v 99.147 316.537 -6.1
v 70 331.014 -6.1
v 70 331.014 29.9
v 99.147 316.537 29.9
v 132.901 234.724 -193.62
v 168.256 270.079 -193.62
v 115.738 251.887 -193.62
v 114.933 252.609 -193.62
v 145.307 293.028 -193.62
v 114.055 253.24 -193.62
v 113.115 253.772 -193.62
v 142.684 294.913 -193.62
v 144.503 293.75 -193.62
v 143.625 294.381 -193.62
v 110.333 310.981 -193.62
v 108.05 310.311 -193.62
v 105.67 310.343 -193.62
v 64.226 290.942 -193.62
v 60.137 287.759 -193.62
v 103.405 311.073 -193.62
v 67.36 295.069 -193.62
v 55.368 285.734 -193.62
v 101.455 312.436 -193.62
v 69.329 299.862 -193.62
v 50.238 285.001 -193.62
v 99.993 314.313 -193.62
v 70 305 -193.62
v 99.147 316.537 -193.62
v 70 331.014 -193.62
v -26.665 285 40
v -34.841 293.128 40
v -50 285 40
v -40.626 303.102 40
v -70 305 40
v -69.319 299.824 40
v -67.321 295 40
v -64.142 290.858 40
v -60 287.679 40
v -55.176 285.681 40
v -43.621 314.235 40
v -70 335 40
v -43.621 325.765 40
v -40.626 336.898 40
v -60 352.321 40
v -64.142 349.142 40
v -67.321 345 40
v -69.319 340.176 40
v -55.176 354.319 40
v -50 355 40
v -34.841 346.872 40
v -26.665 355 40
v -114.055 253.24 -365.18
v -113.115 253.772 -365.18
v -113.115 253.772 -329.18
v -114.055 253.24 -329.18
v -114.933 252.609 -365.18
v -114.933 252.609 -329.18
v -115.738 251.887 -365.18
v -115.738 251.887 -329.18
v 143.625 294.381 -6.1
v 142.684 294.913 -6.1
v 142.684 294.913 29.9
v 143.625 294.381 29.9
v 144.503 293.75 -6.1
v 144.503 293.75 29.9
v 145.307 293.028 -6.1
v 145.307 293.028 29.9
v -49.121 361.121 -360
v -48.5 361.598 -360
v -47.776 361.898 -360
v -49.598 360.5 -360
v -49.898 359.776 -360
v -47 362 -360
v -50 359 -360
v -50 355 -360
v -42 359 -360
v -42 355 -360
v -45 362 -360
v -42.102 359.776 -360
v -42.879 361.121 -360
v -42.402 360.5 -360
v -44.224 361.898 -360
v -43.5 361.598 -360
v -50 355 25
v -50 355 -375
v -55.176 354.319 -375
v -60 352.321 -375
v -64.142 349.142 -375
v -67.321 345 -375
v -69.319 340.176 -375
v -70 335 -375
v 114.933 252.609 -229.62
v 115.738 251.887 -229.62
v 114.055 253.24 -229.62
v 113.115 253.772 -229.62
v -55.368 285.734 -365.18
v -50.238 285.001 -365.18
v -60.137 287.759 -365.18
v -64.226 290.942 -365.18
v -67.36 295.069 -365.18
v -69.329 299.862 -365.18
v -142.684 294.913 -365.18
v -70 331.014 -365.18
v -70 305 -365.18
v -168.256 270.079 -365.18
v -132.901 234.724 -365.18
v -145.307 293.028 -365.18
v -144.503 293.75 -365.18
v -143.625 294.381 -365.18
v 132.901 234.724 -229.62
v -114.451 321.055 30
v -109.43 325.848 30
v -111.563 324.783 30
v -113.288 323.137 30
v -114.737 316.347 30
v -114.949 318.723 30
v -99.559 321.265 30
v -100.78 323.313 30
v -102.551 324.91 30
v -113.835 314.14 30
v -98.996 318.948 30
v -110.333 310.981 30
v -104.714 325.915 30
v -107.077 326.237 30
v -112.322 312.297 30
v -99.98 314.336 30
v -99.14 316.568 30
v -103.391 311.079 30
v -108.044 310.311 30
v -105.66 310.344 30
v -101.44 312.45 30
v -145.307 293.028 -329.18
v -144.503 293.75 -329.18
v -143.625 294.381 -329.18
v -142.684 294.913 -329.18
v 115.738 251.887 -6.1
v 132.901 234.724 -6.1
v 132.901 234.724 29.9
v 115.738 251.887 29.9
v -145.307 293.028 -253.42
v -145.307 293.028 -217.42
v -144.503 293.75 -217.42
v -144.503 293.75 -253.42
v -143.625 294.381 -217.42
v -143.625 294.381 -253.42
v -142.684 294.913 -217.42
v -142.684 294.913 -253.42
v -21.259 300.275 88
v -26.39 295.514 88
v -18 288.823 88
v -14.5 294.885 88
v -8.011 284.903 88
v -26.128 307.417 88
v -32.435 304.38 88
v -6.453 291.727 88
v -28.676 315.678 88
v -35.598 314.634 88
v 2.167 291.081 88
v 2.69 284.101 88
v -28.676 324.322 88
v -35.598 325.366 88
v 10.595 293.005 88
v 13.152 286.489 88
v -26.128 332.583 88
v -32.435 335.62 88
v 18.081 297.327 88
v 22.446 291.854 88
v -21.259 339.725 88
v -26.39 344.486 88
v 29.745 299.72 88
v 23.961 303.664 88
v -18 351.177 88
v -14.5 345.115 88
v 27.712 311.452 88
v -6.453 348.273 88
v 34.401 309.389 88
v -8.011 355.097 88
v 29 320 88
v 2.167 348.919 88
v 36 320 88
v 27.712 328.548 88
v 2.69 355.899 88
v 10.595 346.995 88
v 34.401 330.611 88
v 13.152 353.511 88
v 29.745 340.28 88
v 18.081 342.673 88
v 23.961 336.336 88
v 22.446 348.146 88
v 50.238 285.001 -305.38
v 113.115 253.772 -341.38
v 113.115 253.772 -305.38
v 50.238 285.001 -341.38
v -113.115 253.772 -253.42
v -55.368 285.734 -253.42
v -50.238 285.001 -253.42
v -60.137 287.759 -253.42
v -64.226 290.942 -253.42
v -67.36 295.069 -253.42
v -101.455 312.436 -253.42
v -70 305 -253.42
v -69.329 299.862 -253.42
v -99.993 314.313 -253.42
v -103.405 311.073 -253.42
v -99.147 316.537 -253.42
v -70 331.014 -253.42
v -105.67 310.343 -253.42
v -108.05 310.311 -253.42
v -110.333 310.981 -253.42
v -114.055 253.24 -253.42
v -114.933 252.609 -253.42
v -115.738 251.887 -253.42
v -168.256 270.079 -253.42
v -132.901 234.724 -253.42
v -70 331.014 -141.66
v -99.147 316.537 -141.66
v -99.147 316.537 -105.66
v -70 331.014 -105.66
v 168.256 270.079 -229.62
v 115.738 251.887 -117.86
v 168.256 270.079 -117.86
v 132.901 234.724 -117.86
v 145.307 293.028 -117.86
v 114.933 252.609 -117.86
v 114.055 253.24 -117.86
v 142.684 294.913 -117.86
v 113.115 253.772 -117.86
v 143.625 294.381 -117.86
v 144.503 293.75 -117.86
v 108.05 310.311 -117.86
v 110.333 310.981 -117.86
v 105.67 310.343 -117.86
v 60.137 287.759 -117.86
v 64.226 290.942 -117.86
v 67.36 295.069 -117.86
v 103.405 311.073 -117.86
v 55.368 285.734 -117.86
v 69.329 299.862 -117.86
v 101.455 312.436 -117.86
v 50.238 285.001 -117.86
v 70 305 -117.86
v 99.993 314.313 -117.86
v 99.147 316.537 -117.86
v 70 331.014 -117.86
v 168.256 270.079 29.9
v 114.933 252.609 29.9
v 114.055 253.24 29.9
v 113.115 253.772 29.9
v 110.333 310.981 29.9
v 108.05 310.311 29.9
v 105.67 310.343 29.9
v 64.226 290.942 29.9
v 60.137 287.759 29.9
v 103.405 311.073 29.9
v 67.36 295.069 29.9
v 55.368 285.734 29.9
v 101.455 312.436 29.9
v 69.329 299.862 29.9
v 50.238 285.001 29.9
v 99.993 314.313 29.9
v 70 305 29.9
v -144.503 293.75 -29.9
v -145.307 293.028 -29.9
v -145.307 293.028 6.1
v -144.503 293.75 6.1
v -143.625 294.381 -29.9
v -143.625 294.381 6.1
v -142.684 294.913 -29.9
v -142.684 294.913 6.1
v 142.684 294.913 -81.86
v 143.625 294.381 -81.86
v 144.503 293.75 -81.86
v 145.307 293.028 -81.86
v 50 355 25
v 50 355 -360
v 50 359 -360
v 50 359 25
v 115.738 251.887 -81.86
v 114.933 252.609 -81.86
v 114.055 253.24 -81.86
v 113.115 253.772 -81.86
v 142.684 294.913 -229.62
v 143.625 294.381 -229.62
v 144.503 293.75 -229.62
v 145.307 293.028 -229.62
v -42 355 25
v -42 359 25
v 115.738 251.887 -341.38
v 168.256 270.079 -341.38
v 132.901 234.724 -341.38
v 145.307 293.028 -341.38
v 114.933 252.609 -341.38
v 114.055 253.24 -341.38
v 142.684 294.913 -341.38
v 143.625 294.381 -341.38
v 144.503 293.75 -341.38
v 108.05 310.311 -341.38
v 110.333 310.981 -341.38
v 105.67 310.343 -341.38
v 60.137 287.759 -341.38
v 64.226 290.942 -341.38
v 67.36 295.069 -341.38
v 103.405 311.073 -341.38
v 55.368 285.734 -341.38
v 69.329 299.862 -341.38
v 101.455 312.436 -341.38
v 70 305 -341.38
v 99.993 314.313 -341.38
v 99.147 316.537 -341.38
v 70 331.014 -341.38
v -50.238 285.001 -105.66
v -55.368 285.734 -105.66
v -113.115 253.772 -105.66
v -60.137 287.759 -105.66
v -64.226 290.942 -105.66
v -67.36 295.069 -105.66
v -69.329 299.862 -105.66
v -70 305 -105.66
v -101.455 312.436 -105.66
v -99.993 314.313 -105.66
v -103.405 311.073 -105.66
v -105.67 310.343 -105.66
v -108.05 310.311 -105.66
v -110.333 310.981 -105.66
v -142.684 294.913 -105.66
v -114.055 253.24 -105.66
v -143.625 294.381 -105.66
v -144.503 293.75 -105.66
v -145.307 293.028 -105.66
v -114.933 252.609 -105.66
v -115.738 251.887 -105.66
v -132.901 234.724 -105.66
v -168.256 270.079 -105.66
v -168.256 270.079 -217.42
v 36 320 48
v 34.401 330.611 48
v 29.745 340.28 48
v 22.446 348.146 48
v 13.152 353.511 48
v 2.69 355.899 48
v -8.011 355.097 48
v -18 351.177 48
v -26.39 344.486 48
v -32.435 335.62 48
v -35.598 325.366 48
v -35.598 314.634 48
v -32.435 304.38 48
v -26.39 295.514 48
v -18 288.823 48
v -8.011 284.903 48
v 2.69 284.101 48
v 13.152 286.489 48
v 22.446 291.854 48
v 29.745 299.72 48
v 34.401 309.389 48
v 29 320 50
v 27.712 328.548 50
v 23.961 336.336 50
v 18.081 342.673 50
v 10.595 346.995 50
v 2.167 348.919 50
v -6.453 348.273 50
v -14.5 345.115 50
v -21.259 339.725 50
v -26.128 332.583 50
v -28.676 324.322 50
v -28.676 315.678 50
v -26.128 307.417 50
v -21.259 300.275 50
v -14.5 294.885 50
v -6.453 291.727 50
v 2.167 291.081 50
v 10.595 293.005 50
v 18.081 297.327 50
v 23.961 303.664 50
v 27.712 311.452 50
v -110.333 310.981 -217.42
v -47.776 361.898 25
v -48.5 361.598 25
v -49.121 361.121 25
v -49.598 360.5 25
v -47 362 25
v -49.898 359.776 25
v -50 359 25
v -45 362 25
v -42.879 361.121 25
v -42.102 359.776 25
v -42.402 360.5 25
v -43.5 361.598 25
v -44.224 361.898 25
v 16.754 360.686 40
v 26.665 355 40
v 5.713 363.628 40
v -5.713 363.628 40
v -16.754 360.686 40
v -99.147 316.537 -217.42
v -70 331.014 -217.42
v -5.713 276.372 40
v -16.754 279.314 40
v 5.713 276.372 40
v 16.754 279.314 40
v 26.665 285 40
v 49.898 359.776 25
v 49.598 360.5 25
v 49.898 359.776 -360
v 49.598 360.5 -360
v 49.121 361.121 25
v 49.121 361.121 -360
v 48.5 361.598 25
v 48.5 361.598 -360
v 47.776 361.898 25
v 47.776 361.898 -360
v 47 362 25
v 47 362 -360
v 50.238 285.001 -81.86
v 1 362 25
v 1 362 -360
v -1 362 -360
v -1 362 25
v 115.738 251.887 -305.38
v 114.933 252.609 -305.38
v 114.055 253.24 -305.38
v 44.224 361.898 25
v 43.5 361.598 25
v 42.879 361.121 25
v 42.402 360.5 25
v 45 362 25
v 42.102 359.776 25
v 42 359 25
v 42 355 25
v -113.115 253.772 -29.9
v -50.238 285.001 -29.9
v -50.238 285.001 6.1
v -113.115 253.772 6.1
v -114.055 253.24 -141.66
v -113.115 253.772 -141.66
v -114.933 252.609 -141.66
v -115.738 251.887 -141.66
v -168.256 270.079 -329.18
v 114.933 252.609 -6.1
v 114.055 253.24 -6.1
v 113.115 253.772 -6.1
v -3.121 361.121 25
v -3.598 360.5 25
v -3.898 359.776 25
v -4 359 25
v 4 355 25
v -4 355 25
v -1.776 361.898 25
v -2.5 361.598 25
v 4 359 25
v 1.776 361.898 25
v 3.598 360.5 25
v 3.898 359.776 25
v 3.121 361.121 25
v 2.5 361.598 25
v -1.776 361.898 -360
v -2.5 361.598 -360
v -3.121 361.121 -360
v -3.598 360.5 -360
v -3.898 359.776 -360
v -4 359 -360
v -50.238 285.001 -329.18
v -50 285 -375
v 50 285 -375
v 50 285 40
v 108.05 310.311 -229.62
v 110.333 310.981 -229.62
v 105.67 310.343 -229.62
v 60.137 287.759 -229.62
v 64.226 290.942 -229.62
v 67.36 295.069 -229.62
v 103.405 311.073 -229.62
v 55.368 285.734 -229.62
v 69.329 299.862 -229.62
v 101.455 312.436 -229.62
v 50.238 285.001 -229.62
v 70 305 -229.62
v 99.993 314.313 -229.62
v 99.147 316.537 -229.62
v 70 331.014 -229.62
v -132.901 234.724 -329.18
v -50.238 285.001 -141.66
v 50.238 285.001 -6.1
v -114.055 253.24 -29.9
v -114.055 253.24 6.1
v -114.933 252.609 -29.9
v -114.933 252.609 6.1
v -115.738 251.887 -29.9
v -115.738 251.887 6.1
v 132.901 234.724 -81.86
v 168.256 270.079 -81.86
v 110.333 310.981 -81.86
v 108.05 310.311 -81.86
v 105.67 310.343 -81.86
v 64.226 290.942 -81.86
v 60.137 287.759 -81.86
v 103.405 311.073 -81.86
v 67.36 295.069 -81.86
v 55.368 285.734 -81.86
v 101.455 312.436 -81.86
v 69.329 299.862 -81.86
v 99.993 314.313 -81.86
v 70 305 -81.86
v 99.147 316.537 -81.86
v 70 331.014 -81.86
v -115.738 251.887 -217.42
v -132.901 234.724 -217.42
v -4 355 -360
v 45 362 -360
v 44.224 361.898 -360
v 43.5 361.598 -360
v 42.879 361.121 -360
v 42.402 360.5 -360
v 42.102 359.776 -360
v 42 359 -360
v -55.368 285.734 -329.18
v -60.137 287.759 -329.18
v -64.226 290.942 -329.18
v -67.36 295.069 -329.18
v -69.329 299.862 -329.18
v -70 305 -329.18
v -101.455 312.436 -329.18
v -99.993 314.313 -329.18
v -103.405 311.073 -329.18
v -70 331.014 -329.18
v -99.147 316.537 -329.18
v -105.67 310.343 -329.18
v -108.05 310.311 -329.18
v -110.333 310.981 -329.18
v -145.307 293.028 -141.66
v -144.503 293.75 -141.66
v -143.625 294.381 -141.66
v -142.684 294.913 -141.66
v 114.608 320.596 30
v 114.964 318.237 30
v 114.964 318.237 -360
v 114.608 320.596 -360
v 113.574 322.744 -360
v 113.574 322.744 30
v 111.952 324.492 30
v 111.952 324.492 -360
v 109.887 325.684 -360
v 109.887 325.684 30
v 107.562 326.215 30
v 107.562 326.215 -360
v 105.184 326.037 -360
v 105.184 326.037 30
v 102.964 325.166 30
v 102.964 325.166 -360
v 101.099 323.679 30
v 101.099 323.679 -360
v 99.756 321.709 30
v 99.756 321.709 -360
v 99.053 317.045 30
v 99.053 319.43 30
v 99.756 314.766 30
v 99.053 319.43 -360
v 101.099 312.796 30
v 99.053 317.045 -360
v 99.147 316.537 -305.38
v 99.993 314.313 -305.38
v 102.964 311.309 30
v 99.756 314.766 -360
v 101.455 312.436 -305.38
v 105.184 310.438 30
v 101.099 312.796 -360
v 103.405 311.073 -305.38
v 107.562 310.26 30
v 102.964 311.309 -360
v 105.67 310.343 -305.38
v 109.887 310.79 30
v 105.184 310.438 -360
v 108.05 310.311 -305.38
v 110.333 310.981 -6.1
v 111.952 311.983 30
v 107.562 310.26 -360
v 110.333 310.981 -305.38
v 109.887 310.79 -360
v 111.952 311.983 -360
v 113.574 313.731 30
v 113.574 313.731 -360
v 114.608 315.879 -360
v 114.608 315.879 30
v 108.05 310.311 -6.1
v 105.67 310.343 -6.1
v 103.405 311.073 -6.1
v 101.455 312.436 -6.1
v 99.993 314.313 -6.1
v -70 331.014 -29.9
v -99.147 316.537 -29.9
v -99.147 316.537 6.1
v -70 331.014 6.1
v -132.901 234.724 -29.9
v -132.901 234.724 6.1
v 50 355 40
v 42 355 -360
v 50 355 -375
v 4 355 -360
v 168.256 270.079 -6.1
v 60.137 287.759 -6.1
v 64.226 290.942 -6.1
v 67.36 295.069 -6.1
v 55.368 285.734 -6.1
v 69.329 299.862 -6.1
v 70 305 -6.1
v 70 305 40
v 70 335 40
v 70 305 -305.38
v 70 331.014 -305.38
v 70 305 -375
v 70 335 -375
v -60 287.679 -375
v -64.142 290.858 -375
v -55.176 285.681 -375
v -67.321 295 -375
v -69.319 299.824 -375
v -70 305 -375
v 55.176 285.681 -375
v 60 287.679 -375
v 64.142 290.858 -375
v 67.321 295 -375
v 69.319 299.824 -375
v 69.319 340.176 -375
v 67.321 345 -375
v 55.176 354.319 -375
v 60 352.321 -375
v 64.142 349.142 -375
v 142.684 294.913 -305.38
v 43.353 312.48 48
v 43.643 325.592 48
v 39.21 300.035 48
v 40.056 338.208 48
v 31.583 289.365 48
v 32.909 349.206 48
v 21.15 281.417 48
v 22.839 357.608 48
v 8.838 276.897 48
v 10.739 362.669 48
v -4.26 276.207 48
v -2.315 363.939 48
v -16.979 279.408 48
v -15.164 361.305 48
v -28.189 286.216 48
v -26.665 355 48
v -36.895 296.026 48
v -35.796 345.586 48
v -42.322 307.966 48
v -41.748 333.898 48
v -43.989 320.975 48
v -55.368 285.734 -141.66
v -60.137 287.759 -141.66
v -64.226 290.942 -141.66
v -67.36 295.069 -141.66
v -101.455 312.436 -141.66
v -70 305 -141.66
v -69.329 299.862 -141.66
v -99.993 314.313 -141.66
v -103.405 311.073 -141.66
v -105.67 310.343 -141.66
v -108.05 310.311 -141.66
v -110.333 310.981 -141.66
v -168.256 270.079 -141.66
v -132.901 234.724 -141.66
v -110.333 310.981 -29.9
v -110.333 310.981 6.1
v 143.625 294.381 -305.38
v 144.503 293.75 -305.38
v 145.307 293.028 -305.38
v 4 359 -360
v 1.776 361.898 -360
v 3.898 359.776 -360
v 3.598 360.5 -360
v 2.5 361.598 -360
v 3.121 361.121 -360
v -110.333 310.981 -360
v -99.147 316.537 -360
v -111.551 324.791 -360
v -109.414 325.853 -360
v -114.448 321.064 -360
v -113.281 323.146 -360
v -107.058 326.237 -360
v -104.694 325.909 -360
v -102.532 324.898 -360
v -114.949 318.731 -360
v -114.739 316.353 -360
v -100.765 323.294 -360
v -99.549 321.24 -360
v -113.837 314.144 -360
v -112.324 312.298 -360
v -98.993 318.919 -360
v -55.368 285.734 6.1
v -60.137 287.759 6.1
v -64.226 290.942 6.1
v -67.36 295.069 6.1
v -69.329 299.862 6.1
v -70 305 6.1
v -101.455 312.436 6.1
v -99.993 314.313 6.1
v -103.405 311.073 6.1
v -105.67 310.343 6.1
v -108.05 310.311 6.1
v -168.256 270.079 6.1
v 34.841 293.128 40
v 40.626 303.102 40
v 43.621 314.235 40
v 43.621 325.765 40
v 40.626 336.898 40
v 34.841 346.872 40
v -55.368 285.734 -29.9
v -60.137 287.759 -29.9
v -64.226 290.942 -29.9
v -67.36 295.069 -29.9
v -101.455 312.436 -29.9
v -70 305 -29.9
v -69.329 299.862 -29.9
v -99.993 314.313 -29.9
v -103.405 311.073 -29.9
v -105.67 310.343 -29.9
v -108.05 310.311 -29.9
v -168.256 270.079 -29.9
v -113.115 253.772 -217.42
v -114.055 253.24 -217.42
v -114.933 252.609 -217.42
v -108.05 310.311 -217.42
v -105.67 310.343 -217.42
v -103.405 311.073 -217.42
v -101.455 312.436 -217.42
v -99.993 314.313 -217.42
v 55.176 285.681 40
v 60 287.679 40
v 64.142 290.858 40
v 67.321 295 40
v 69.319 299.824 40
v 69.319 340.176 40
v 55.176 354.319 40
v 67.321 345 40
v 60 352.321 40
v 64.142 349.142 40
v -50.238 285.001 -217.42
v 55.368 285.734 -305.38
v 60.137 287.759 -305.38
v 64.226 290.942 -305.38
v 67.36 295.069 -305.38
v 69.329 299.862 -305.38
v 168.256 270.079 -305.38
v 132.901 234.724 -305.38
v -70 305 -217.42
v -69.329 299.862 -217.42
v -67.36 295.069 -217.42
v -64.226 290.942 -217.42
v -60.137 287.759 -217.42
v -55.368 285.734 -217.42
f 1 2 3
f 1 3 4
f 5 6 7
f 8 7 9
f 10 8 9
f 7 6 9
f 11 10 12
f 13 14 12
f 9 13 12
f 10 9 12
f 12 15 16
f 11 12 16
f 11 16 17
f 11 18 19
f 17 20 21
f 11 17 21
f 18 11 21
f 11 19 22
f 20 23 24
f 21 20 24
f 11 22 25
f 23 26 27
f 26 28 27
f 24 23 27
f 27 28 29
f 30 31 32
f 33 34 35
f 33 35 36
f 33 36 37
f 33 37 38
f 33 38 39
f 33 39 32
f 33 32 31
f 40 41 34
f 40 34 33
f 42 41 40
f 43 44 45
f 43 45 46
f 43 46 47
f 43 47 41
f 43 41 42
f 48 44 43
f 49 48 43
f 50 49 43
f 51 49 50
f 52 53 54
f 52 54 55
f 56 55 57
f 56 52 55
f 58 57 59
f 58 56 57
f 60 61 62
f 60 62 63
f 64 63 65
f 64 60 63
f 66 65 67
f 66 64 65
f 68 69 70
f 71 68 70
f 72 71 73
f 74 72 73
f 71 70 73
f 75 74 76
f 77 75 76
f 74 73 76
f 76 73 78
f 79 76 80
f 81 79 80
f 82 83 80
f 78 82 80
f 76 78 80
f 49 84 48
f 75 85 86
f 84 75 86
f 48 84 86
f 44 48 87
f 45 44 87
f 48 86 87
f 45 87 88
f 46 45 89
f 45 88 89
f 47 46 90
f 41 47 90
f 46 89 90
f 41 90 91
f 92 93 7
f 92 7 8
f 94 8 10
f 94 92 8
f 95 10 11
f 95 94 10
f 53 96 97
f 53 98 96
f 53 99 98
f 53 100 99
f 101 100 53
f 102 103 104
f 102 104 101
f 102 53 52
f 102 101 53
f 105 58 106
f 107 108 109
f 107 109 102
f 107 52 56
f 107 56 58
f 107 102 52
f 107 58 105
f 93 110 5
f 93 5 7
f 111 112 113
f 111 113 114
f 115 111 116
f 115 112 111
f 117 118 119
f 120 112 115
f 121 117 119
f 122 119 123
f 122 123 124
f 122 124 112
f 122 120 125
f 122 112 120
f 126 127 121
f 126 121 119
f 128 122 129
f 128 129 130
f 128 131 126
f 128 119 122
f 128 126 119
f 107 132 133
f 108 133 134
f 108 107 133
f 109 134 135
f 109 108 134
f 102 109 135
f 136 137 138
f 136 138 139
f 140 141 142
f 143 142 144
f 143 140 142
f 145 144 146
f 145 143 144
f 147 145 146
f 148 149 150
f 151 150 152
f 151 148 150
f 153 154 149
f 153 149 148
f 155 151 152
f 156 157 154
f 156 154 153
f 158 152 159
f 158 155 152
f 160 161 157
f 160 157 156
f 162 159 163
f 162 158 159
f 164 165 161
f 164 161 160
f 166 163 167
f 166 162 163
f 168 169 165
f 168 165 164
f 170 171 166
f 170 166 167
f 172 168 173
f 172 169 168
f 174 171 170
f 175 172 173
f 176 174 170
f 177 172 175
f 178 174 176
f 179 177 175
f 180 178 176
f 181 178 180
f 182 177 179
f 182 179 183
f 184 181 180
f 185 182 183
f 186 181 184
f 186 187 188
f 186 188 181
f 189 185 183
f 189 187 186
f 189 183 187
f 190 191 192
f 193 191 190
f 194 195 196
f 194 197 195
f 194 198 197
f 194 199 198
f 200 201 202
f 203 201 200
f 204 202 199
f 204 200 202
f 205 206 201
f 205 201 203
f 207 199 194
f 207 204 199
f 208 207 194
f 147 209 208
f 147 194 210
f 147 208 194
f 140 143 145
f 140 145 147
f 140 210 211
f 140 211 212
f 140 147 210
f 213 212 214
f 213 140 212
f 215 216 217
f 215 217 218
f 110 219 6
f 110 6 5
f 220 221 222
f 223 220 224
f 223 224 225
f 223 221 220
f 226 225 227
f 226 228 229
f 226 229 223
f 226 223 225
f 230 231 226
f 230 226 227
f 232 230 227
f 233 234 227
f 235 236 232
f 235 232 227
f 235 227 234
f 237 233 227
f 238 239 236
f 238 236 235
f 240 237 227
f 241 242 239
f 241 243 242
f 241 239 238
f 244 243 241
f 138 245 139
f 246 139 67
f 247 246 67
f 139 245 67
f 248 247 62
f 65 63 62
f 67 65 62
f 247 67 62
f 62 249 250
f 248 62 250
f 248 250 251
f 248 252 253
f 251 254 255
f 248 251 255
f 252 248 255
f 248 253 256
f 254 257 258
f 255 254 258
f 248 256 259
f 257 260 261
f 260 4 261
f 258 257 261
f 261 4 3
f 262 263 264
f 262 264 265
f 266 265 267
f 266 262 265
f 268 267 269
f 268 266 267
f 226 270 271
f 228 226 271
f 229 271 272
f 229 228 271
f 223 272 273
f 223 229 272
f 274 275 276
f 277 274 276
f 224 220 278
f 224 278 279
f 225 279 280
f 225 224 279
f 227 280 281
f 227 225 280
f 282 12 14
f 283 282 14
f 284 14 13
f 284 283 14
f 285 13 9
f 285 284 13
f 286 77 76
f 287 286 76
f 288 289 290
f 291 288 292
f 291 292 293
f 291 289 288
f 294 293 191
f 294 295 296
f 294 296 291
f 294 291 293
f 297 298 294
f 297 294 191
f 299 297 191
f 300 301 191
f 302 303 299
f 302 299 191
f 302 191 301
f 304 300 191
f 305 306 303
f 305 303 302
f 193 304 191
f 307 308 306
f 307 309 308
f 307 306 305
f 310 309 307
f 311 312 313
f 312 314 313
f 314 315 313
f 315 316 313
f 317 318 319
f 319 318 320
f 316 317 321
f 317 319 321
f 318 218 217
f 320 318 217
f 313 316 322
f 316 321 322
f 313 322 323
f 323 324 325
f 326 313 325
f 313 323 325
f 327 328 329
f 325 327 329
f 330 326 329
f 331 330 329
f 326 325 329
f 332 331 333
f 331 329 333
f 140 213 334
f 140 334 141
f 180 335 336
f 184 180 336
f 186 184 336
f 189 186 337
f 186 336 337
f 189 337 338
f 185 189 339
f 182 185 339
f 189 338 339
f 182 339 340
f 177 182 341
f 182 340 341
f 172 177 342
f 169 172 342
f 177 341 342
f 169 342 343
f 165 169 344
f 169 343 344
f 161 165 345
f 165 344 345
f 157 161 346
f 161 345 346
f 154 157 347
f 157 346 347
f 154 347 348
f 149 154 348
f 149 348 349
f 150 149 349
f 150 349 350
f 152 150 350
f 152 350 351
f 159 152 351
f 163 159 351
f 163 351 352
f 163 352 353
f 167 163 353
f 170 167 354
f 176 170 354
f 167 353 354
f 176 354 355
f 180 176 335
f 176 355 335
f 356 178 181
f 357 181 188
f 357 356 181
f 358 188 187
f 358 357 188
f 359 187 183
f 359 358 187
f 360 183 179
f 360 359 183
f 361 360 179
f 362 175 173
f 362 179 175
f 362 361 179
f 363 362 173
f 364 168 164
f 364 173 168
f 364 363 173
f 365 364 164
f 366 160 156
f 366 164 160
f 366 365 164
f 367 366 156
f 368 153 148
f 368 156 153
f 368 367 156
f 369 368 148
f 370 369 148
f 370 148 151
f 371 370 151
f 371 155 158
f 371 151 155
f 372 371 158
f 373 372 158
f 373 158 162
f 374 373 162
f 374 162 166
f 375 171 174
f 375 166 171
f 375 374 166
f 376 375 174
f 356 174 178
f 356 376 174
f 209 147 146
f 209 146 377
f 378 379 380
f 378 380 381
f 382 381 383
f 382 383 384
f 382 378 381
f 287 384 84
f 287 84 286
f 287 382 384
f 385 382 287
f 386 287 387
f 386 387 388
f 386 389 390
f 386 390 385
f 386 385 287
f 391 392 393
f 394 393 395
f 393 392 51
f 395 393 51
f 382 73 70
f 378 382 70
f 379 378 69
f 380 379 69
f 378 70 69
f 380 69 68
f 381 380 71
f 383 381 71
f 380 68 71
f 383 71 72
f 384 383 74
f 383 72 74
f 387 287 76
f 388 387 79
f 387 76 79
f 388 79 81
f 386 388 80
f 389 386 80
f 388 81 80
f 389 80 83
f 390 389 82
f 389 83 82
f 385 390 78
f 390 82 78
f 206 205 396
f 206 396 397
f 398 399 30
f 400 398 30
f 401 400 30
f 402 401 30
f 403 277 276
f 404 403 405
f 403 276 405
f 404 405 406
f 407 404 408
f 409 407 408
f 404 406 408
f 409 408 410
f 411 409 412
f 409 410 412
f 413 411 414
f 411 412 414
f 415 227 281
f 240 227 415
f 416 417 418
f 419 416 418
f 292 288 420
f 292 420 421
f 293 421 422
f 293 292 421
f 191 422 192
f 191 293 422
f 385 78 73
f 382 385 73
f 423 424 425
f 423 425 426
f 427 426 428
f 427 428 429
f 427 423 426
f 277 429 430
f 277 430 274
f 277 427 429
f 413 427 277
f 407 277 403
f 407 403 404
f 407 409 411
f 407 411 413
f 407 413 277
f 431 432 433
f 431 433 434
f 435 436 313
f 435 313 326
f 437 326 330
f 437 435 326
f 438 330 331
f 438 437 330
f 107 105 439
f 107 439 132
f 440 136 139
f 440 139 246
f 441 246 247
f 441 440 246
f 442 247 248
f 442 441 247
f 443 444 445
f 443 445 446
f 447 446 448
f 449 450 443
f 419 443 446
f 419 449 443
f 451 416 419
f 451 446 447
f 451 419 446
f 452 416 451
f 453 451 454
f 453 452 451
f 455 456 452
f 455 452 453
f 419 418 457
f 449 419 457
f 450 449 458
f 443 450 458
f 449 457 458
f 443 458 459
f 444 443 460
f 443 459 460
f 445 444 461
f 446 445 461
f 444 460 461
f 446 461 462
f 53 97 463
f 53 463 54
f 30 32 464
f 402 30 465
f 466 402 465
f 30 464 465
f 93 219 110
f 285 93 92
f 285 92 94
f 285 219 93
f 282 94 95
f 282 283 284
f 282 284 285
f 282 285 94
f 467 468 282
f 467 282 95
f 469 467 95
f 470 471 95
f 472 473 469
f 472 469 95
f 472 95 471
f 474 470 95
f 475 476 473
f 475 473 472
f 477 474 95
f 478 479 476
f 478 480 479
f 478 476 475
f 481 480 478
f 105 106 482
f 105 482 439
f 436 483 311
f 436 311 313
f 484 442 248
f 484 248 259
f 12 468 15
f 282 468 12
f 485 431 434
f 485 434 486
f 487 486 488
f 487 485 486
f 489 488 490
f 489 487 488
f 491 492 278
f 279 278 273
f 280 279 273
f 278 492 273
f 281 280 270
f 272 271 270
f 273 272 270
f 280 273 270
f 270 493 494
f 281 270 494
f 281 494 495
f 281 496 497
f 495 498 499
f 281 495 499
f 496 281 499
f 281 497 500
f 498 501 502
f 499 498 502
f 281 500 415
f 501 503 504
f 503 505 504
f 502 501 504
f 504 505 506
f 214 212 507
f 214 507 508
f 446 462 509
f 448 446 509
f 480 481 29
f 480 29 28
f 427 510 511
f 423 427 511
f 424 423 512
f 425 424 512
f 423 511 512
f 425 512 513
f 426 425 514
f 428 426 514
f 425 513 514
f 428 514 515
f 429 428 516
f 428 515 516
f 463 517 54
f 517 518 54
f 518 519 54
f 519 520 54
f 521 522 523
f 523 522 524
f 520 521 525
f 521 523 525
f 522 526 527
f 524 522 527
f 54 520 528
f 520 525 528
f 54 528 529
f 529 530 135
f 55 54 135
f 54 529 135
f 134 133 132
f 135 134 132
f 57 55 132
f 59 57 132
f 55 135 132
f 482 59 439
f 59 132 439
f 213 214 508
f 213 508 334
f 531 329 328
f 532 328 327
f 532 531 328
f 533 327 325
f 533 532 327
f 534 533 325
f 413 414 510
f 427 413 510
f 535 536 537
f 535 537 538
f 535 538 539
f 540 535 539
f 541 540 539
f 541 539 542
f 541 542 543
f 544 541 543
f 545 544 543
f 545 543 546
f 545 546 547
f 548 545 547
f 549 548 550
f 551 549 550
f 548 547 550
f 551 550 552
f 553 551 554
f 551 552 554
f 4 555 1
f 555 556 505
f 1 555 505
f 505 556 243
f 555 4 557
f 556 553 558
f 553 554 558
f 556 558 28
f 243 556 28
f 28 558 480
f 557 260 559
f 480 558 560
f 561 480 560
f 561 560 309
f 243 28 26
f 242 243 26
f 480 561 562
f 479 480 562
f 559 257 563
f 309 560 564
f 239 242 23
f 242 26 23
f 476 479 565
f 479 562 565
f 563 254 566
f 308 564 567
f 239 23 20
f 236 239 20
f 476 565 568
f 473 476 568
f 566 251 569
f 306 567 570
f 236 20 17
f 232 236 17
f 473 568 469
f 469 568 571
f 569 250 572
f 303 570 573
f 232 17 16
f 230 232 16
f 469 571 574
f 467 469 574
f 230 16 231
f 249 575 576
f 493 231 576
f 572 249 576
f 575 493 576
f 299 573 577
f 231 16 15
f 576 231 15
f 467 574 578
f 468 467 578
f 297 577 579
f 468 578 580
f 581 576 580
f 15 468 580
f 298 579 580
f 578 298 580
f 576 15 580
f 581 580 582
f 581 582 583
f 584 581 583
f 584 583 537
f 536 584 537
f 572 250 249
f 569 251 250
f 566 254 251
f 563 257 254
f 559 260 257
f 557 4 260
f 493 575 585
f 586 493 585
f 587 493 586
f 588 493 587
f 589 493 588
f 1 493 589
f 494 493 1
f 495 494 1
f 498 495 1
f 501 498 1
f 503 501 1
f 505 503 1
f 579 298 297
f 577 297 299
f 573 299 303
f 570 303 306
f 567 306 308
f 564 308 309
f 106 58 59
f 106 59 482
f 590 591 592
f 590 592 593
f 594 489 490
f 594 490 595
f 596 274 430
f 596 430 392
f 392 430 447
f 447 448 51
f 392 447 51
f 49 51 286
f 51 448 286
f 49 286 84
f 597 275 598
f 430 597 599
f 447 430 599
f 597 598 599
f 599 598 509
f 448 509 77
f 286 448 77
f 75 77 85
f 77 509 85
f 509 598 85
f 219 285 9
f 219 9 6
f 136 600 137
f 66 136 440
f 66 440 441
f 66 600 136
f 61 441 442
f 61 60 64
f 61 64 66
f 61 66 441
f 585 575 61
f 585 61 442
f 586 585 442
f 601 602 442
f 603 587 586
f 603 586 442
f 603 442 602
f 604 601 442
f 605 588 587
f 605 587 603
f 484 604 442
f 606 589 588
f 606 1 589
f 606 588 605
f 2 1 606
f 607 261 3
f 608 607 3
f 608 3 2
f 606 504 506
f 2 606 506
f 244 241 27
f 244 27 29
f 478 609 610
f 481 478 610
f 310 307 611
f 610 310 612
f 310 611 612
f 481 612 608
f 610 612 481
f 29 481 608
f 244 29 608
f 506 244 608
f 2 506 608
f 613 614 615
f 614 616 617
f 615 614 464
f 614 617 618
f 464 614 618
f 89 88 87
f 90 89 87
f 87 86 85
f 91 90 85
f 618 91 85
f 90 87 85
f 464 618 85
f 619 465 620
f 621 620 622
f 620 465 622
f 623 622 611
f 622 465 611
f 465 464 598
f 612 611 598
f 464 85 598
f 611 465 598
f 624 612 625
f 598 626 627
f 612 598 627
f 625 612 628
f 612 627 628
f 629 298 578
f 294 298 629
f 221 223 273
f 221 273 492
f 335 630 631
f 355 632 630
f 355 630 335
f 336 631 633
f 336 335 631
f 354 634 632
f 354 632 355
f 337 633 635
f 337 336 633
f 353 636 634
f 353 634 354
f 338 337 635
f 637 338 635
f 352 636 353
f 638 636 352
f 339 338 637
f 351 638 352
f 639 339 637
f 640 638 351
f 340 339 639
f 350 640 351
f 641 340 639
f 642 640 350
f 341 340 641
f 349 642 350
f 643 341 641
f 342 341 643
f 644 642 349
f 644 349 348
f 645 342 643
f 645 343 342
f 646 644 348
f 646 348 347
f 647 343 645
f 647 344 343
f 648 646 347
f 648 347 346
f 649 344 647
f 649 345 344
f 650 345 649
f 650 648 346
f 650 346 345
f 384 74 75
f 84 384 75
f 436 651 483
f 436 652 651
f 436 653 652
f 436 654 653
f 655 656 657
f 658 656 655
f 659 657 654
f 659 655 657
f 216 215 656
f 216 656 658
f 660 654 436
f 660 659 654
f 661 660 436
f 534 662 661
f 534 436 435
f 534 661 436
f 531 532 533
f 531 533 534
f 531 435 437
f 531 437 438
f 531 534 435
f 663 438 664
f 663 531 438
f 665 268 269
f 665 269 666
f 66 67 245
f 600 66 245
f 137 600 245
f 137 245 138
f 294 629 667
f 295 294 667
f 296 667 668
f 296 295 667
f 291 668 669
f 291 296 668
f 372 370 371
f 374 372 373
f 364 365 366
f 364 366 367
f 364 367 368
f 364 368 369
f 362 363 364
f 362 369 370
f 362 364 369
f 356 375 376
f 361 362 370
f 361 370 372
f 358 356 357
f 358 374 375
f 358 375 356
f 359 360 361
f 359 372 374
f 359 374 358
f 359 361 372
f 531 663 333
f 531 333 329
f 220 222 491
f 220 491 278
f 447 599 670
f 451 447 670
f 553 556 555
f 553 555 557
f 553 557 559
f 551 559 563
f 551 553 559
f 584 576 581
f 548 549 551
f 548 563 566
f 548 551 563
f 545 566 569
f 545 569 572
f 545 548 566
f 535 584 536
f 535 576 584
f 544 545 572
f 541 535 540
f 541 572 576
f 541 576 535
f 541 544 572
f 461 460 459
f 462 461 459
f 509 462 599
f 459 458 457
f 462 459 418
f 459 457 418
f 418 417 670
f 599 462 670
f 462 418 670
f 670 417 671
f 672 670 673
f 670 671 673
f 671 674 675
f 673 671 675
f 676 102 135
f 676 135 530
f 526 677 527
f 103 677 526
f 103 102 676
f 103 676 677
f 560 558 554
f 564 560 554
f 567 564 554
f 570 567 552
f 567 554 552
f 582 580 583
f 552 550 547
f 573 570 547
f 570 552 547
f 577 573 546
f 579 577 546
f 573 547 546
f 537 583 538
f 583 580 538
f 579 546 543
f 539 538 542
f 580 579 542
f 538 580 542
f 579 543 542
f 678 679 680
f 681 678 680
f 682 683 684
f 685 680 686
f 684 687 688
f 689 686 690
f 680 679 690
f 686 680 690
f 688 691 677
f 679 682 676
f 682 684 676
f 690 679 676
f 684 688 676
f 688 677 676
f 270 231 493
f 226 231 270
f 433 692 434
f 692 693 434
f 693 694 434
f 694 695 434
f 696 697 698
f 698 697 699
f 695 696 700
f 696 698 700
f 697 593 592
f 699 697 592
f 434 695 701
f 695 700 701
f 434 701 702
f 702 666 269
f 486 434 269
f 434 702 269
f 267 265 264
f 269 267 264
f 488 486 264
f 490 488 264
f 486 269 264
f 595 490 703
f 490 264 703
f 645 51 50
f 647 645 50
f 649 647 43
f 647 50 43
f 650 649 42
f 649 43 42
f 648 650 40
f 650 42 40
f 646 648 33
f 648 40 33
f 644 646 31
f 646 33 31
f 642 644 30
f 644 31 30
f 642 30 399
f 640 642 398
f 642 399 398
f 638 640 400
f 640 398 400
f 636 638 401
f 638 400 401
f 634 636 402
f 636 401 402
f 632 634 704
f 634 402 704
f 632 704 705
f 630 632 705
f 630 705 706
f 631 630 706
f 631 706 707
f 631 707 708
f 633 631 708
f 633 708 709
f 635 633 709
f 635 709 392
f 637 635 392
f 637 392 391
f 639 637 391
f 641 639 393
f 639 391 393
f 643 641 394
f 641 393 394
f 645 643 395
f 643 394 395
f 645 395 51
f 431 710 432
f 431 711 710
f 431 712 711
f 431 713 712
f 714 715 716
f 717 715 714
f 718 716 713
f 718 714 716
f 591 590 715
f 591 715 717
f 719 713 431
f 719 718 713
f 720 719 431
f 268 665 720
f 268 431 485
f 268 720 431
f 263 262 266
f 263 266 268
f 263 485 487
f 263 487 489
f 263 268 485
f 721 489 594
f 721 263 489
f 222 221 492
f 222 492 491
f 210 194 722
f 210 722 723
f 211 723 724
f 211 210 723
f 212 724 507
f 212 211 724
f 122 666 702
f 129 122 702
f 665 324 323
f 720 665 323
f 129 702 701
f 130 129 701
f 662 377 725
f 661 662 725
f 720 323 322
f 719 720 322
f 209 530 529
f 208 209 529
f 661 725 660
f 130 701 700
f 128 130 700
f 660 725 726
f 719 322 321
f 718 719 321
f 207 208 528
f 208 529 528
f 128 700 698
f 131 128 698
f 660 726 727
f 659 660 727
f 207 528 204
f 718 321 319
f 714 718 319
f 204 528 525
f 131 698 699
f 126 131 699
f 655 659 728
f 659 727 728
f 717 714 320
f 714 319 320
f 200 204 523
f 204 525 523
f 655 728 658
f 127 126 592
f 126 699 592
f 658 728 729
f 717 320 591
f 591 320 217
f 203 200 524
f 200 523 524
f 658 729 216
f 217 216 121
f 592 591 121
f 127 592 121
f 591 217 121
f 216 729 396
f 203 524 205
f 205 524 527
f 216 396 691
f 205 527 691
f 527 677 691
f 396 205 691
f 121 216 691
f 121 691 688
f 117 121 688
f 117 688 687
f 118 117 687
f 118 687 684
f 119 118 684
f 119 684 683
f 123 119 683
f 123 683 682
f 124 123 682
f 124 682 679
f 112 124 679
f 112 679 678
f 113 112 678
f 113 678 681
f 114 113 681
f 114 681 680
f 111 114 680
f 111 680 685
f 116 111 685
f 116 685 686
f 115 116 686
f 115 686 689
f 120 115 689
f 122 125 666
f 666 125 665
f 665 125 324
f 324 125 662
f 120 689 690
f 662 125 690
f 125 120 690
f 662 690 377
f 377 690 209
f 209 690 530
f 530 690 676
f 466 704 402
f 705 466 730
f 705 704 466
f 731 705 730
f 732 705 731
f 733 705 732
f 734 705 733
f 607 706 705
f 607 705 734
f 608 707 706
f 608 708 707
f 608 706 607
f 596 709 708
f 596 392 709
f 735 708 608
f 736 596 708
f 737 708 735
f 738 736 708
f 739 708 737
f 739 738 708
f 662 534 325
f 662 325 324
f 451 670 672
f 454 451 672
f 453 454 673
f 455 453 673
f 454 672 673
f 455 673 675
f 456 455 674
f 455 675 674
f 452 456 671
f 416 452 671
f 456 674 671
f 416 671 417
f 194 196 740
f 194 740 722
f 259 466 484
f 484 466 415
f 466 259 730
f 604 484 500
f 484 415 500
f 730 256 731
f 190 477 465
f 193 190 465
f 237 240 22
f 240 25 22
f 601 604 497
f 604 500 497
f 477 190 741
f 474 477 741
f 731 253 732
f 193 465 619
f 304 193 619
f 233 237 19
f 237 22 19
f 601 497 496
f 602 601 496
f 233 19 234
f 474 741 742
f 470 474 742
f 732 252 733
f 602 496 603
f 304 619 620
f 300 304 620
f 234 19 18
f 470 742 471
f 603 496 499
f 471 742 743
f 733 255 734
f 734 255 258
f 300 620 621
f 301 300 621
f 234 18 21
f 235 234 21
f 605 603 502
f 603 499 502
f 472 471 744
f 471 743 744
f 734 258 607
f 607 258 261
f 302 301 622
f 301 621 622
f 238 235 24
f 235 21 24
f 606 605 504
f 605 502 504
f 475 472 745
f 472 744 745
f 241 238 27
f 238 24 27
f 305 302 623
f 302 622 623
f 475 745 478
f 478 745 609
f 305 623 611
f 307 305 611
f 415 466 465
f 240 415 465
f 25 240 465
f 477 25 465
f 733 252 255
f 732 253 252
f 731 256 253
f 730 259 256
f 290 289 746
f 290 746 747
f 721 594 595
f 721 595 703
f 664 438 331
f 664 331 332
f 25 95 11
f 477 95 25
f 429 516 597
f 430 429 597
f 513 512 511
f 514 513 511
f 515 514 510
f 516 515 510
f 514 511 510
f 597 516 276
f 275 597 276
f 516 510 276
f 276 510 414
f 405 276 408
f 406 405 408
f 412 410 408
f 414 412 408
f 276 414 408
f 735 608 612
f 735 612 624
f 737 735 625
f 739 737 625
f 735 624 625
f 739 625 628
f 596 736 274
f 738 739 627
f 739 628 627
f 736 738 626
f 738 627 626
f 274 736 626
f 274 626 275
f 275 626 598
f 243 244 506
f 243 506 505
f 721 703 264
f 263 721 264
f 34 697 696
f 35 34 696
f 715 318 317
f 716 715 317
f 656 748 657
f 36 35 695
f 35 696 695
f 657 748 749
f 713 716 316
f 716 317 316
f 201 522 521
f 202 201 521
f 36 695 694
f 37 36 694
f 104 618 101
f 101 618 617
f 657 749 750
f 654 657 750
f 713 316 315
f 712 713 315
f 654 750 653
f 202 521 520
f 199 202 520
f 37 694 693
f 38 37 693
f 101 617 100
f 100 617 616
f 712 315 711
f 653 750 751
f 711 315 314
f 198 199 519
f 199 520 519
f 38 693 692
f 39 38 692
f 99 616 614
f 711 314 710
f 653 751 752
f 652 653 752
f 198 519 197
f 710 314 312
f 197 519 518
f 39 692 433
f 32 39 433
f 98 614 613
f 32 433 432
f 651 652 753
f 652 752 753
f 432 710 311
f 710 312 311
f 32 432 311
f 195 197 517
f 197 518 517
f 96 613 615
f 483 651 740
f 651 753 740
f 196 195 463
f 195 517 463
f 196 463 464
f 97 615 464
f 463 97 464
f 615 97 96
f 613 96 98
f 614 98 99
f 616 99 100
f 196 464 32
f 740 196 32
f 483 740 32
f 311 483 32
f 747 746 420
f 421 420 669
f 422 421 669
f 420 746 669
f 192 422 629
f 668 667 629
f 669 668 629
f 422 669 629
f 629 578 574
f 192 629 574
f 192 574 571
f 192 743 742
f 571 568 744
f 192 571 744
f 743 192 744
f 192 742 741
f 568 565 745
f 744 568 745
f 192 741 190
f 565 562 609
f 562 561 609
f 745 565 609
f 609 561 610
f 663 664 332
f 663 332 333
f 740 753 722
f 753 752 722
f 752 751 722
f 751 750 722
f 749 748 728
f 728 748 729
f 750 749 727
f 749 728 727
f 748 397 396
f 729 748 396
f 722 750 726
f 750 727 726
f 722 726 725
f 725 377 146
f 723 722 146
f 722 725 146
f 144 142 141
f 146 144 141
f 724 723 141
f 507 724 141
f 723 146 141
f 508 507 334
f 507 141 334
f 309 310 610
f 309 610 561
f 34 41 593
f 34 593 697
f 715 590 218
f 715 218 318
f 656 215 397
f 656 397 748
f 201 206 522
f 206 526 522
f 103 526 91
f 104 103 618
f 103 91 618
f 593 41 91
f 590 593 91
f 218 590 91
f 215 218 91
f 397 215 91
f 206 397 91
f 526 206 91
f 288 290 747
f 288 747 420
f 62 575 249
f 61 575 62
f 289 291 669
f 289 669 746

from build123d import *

# Parameters (mm, degrees)
PLENUM_START          = -375
PLENUM_DEPTH          = 415
PLENUM_START_2        = -360
PLENUM_RIBS_DEPTH     = 385
RUNNER_START          = -6.1
RUNNER_1_DEPTH        = 36
RUNNER_START_2        = -29.9
RUNNER_2_DEPTH        = 36
RUNNER_START_3        = -117.86
RUNNER_3_DEPTH        = 36
RUNNER_START_4        = -141.66
RUNNER_4_DEPTH        = 36
RUNNER_START_5        = -229.62
RUNNER_5_DEPTH        = 36
RUNNER_START_6        = -253.42
RUNNER_6_DEPTH        = 36
RUNNER_START_7        = -341.38
RUNNER_7_DEPTH        = 36
RUNNER_START_8        = -365.18
RUNNER_8_DEPTH        = 36
THROTTLE_START        = 40
SKETCH11_R            = 44
THROTTLE_FLANGE_DEPTH = 8
THROTTLE_START_2      = 48
SKETCH12_R            = 36
THROTTLE_BODY_DEPTH   = 40
THROTTLE_START_3      = 50
SKETCH13_R            = 29
THROTTLE_BORE_DEPTH   = 40
FUEL_START            = -360
SKETCH14_R            = 8
FUEL_RAILS_DEPTH      = 390


with BuildPart() as part:
    # Sketch1 → Plenum (new body)
    with BuildSketch(Plane.XY.offset(PLENUM_START)):
        with BuildLine():
            Line((-50, 285), (50, 285))
            ThreePointArc((50, 285), (64.142135624, 290.857864376), (70, 305))
            Line((70, 305), (70, 335))
            ThreePointArc((70, 335), (64.142135624, 349.142135624), (50, 355))
            Line((50, 355), (-50, 355))
            ThreePointArc((-50, 355), (-64.142135624, 349.142135624), (-70, 335))
            Line((-70, 335), (-70, 305))
            ThreePointArc((-70, 305), (-64.142135624, 290.857864376), (-50, 285))
        make_face()
    extrude(amount=PLENUM_DEPTH)

    # Sketch2 → Plenum Ribs (add)
    with BuildSketch(Plane.XY.offset(PLENUM_START_2)):
        with BuildLine():
            Line((-50, 350), (-42, 350))
            Line((-42, 350), (-42, 359))
            ThreePointArc((-42, 359), (-42.878679656, 361.121320344), (-45, 362))
            Line((-45, 362), (-47, 362))
            ThreePointArc((-47, 362), (-49.121320344, 361.121320344), (-50, 359))
            Line((-50, 359), (-50, 350))
        make_face()
        with BuildLine():
            Line((-4, 350), (4, 350))
            Line((4, 350), (4, 359))
            ThreePointArc((4, 359), (3.121320344, 361.121320344), (1, 362))
            Line((1, 362), (-1, 362))
            ThreePointArc((-1, 362), (-3.121320344, 361.121320344), (-4, 359))
            Line((-4, 359), (-4, 350))
        make_face()
        with BuildLine():
            Line((42, 350), (50, 350))
            Line((50, 350), (50, 359))
            ThreePointArc((50, 359), (49.121320344, 361.121320344), (47, 362))
            Line((47, 362), (45, 362))
            ThreePointArc((45, 362), (42.878679656, 361.121320344), (42, 359))
            Line((42, 359), (42, 350))
        make_face()
    extrude(amount=PLENUM_RIBS_DEPTH)

    # Sketch3 → Runner 1 (add)
    with BuildSketch(Plane.XY.offset(RUNNER_START)):
        with BuildLine():
            Line((132.900719524, 234.724096015), (115.737566336, 251.887249203))
            ThreePointArc((115.737566336, 251.887249203), (114.502776925, 252.936394099), (113.114761283, 253.772350127))
            Line((113.114761283, 253.772350127), (28.879343102, 295.60957816))
            Line((28.879343102, 295.60957816), (51.120656898, 340.39042184))
            Line((51.120656898, 340.39042184), (142.684314275, 294.913475254))
            ThreePointArc((142.684314275, 294.913475254), (144.072329917, 294.077519226), (145.307119327, 293.02837433))
            Line((145.307119327, 293.02837433), (168.256058583, 270.079435074))
            Line((168.256058583, 270.079435074), (132.900719524, 234.724096015))
        make_face()
    extrude(amount=RUNNER_1_DEPTH)

    # Sketch4 → Runner 2 (add)
    with BuildSketch(Plane.XY.offset(RUNNER_START_2)):
        with BuildLine():
            Line((-168.256058583, 270.079435074), (-145.307119327, 293.02837433))
            ThreePointArc((-145.307119327, 293.02837433), (-144.072329917, 294.077519226), (-142.684314275, 294.913475254))
            Line((-142.684314275, 294.913475254), (-51.120656898, 340.39042184))
            Line((-51.120656898, 340.39042184), (-28.879343102, 295.60957816))
            Line((-28.879343102, 295.60957816), (-113.114761283, 253.772350127))
            ThreePointArc((-113.114761283, 253.772350127), (-114.502776925, 252.936394099), (-115.737566336, 251.887249203))
            Line((-115.737566336, 251.887249203), (-132.900719524, 234.724096015))
            Line((-132.900719524, 234.724096015), (-168.256058583, 270.079435074))
        make_face()
    extrude(amount=RUNNER_2_DEPTH)

    # Sketch5 → Runner 3 (add)
    with BuildSketch(Plane.XY.offset(RUNNER_START_3)):
        with BuildLine():
            Line((132.900719524, 234.724096015), (115.737566336, 251.887249203))
            ThreePointArc((115.737566336, 251.887249203), (114.502776925, 252.936394099), (113.114761283, 253.772350127))
            Line((113.114761283, 253.772350127), (28.879343102, 295.60957816))
            Line((28.879343102, 295.60957816), (51.120656898, 340.39042184))
            Line((51.120656898, 340.39042184), (142.684314275, 294.913475254))
            ThreePointArc((142.684314275, 294.913475254), (144.072329917, 294.077519226), (145.307119327, 293.02837433))
            Line((145.307119327, 293.02837433), (168.256058583, 270.079435074))
            Line((168.256058583, 270.079435074), (132.900719524, 234.724096015))
        make_face()
    extrude(amount=RUNNER_3_DEPTH)

    # Sketch6 → Runner 4 (add)
    with BuildSketch(Plane.XY.offset(RUNNER_START_4)):
        with BuildLine():
            Line((-168.256058583, 270.079435074), (-145.307119327, 293.02837433))
            ThreePointArc((-145.307119327, 293.02837433), (-144.072329917, 294.077519226), (-142.684314275, 294.913475254))
            Line((-142.684314275, 294.913475254), (-51.120656898, 340.39042184))
            Line((-51.120656898, 340.39042184), (-28.879343102, 295.60957816))
            Line((-28.879343102, 295.60957816), (-113.114761283, 253.772350127))
            ThreePointArc((-113.114761283, 253.772350127), (-114.502776925, 252.936394099), (-115.737566336, 251.887249203))
            Line((-115.737566336, 251.887249203), (-132.900719524, 234.724096015))
            Line((-132.900719524, 234.724096015), (-168.256058583, 270.079435074))
        make_face()
    extrude(amount=RUNNER_4_DEPTH)

    # Sketch7 → Runner 5 (add)
    with BuildSketch(Plane.XY.offset(RUNNER_START_5)):
        with BuildLine():
            Line((132.900719524, 234.724096015), (115.737566336, 251.887249203))
            ThreePointArc((115.737566336, 251.887249203), (114.502776925, 252.936394099), (113.114761283, 253.772350127))
            Line((113.114761283, 253.772350127), (28.879343102, 295.60957816))
            Line((28.879343102, 295.60957816), (51.120656898, 340.39042184))
            Line((51.120656898, 340.39042184), (142.684314275, 294.913475254))
            ThreePointArc((142.684314275, 294.913475254), (144.072329917, 294.077519226), (145.307119327, 293.02837433))
            Line((145.307119327, 293.02837433), (168.256058583, 270.079435074))
            Line((168.256058583, 270.079435074), (132.900719524, 234.724096015))
        make_face()
    extrude(amount=RUNNER_5_DEPTH)

    # Sketch8 → Runner 6 (add)
    with BuildSketch(Plane.XY.offset(RUNNER_START_6)):
        with BuildLine():
            Line((-168.256058583, 270.079435074), (-145.307119327, 293.02837433))
            ThreePointArc((-145.307119327, 293.02837433), (-144.072329917, 294.077519226), (-142.684314275, 294.913475254))
            Line((-142.684314275, 294.913475254), (-51.120656898, 340.39042184))
            Line((-51.120656898, 340.39042184), (-28.879343102, 295.60957816))
            Line((-28.879343102, 295.60957816), (-113.114761283, 253.772350127))
            ThreePointArc((-113.114761283, 253.772350127), (-114.502776925, 252.936394099), (-115.737566336, 251.887249203))
            Line((-115.737566336, 251.887249203), (-132.900719524, 234.724096015))
            Line((-132.900719524, 234.724096015), (-168.256058583, 270.079435074))
        make_face()
    extrude(amount=RUNNER_6_DEPTH)

    # Sketch9 → Runner 7 (add)
    with BuildSketch(Plane.XY.offset(RUNNER_START_7)):
        with BuildLine():
            Line((132.900719524, 234.724096015), (115.737566336, 251.887249203))
            ThreePointArc((115.737566336, 251.887249203), (114.502776925, 252.936394099), (113.114761283, 253.772350127))
            Line((113.114761283, 253.772350127), (28.879343102, 295.60957816))
            Line((28.879343102, 295.60957816), (51.120656898, 340.39042184))
            Line((51.120656898, 340.39042184), (142.684314275, 294.913475254))
            ThreePointArc((142.684314275, 294.913475254), (144.072329917, 294.077519226), (145.307119327, 293.02837433))
            Line((145.307119327, 293.02837433), (168.256058583, 270.079435074))
            Line((168.256058583, 270.079435074), (132.900719524, 234.724096015))
        make_face()
    extrude(amount=RUNNER_7_DEPTH)

    # Sketch10 → Runner 8 (add)
    with BuildSketch(Plane.XY.offset(RUNNER_START_8)):
        with BuildLine():
            Line((-168.256058583, 270.079435074), (-145.307119327, 293.02837433))
            ThreePointArc((-145.307119327, 293.02837433), (-144.072329917, 294.077519226), (-142.684314275, 294.913475254))
            Line((-142.684314275, 294.913475254), (-51.120656898, 340.39042184))
            Line((-51.120656898, 340.39042184), (-28.879343102, 295.60957816))
            Line((-28.879343102, 295.60957816), (-113.114761283, 253.772350127))
            ThreePointArc((-113.114761283, 253.772350127), (-114.502776925, 252.936394099), (-115.737566336, 251.887249203))
            Line((-115.737566336, 251.887249203), (-132.900719524, 234.724096015))
            Line((-132.900719524, 234.724096015), (-168.256058583, 270.079435074))
        make_face()
    extrude(amount=RUNNER_8_DEPTH)

    # Sketch11 → Throttle Flange (add)
    with BuildSketch(Plane.XY.offset(THROTTLE_START)):
        with Locations((0, 320)):
            Circle(SKETCH11_R)
    extrude(amount=THROTTLE_FLANGE_DEPTH)

    # Sketch12 → Throttle Body (add)
    with BuildSketch(Plane.XY.offset(THROTTLE_START_2)):
        with Locations((0, 320)):
            Circle(SKETCH12_R)
    extrude(amount=THROTTLE_BODY_DEPTH)

    # Sketch13 → Throttle Bore (cut)
    with BuildSketch(Plane.XY.offset(THROTTLE_START_3)):
        with Locations((0, 320)):
            Circle(SKETCH13_R)
    extrude(amount=THROTTLE_BORE_DEPTH, mode=Mode.SUBTRACT)

    # Sketch14 → Fuel Rails (add)
    with BuildSketch(Plane.XY.offset(FUEL_START)):
        with Locations((106.963899649, 318.237487596)):
            Circle(SKETCH14_R)
        with Locations((-106.963899649, 318.237487596)):
            Circle(SKETCH14_R)
    extrude(amount=FUEL_RAILS_DEPTH)


solid = part.part
